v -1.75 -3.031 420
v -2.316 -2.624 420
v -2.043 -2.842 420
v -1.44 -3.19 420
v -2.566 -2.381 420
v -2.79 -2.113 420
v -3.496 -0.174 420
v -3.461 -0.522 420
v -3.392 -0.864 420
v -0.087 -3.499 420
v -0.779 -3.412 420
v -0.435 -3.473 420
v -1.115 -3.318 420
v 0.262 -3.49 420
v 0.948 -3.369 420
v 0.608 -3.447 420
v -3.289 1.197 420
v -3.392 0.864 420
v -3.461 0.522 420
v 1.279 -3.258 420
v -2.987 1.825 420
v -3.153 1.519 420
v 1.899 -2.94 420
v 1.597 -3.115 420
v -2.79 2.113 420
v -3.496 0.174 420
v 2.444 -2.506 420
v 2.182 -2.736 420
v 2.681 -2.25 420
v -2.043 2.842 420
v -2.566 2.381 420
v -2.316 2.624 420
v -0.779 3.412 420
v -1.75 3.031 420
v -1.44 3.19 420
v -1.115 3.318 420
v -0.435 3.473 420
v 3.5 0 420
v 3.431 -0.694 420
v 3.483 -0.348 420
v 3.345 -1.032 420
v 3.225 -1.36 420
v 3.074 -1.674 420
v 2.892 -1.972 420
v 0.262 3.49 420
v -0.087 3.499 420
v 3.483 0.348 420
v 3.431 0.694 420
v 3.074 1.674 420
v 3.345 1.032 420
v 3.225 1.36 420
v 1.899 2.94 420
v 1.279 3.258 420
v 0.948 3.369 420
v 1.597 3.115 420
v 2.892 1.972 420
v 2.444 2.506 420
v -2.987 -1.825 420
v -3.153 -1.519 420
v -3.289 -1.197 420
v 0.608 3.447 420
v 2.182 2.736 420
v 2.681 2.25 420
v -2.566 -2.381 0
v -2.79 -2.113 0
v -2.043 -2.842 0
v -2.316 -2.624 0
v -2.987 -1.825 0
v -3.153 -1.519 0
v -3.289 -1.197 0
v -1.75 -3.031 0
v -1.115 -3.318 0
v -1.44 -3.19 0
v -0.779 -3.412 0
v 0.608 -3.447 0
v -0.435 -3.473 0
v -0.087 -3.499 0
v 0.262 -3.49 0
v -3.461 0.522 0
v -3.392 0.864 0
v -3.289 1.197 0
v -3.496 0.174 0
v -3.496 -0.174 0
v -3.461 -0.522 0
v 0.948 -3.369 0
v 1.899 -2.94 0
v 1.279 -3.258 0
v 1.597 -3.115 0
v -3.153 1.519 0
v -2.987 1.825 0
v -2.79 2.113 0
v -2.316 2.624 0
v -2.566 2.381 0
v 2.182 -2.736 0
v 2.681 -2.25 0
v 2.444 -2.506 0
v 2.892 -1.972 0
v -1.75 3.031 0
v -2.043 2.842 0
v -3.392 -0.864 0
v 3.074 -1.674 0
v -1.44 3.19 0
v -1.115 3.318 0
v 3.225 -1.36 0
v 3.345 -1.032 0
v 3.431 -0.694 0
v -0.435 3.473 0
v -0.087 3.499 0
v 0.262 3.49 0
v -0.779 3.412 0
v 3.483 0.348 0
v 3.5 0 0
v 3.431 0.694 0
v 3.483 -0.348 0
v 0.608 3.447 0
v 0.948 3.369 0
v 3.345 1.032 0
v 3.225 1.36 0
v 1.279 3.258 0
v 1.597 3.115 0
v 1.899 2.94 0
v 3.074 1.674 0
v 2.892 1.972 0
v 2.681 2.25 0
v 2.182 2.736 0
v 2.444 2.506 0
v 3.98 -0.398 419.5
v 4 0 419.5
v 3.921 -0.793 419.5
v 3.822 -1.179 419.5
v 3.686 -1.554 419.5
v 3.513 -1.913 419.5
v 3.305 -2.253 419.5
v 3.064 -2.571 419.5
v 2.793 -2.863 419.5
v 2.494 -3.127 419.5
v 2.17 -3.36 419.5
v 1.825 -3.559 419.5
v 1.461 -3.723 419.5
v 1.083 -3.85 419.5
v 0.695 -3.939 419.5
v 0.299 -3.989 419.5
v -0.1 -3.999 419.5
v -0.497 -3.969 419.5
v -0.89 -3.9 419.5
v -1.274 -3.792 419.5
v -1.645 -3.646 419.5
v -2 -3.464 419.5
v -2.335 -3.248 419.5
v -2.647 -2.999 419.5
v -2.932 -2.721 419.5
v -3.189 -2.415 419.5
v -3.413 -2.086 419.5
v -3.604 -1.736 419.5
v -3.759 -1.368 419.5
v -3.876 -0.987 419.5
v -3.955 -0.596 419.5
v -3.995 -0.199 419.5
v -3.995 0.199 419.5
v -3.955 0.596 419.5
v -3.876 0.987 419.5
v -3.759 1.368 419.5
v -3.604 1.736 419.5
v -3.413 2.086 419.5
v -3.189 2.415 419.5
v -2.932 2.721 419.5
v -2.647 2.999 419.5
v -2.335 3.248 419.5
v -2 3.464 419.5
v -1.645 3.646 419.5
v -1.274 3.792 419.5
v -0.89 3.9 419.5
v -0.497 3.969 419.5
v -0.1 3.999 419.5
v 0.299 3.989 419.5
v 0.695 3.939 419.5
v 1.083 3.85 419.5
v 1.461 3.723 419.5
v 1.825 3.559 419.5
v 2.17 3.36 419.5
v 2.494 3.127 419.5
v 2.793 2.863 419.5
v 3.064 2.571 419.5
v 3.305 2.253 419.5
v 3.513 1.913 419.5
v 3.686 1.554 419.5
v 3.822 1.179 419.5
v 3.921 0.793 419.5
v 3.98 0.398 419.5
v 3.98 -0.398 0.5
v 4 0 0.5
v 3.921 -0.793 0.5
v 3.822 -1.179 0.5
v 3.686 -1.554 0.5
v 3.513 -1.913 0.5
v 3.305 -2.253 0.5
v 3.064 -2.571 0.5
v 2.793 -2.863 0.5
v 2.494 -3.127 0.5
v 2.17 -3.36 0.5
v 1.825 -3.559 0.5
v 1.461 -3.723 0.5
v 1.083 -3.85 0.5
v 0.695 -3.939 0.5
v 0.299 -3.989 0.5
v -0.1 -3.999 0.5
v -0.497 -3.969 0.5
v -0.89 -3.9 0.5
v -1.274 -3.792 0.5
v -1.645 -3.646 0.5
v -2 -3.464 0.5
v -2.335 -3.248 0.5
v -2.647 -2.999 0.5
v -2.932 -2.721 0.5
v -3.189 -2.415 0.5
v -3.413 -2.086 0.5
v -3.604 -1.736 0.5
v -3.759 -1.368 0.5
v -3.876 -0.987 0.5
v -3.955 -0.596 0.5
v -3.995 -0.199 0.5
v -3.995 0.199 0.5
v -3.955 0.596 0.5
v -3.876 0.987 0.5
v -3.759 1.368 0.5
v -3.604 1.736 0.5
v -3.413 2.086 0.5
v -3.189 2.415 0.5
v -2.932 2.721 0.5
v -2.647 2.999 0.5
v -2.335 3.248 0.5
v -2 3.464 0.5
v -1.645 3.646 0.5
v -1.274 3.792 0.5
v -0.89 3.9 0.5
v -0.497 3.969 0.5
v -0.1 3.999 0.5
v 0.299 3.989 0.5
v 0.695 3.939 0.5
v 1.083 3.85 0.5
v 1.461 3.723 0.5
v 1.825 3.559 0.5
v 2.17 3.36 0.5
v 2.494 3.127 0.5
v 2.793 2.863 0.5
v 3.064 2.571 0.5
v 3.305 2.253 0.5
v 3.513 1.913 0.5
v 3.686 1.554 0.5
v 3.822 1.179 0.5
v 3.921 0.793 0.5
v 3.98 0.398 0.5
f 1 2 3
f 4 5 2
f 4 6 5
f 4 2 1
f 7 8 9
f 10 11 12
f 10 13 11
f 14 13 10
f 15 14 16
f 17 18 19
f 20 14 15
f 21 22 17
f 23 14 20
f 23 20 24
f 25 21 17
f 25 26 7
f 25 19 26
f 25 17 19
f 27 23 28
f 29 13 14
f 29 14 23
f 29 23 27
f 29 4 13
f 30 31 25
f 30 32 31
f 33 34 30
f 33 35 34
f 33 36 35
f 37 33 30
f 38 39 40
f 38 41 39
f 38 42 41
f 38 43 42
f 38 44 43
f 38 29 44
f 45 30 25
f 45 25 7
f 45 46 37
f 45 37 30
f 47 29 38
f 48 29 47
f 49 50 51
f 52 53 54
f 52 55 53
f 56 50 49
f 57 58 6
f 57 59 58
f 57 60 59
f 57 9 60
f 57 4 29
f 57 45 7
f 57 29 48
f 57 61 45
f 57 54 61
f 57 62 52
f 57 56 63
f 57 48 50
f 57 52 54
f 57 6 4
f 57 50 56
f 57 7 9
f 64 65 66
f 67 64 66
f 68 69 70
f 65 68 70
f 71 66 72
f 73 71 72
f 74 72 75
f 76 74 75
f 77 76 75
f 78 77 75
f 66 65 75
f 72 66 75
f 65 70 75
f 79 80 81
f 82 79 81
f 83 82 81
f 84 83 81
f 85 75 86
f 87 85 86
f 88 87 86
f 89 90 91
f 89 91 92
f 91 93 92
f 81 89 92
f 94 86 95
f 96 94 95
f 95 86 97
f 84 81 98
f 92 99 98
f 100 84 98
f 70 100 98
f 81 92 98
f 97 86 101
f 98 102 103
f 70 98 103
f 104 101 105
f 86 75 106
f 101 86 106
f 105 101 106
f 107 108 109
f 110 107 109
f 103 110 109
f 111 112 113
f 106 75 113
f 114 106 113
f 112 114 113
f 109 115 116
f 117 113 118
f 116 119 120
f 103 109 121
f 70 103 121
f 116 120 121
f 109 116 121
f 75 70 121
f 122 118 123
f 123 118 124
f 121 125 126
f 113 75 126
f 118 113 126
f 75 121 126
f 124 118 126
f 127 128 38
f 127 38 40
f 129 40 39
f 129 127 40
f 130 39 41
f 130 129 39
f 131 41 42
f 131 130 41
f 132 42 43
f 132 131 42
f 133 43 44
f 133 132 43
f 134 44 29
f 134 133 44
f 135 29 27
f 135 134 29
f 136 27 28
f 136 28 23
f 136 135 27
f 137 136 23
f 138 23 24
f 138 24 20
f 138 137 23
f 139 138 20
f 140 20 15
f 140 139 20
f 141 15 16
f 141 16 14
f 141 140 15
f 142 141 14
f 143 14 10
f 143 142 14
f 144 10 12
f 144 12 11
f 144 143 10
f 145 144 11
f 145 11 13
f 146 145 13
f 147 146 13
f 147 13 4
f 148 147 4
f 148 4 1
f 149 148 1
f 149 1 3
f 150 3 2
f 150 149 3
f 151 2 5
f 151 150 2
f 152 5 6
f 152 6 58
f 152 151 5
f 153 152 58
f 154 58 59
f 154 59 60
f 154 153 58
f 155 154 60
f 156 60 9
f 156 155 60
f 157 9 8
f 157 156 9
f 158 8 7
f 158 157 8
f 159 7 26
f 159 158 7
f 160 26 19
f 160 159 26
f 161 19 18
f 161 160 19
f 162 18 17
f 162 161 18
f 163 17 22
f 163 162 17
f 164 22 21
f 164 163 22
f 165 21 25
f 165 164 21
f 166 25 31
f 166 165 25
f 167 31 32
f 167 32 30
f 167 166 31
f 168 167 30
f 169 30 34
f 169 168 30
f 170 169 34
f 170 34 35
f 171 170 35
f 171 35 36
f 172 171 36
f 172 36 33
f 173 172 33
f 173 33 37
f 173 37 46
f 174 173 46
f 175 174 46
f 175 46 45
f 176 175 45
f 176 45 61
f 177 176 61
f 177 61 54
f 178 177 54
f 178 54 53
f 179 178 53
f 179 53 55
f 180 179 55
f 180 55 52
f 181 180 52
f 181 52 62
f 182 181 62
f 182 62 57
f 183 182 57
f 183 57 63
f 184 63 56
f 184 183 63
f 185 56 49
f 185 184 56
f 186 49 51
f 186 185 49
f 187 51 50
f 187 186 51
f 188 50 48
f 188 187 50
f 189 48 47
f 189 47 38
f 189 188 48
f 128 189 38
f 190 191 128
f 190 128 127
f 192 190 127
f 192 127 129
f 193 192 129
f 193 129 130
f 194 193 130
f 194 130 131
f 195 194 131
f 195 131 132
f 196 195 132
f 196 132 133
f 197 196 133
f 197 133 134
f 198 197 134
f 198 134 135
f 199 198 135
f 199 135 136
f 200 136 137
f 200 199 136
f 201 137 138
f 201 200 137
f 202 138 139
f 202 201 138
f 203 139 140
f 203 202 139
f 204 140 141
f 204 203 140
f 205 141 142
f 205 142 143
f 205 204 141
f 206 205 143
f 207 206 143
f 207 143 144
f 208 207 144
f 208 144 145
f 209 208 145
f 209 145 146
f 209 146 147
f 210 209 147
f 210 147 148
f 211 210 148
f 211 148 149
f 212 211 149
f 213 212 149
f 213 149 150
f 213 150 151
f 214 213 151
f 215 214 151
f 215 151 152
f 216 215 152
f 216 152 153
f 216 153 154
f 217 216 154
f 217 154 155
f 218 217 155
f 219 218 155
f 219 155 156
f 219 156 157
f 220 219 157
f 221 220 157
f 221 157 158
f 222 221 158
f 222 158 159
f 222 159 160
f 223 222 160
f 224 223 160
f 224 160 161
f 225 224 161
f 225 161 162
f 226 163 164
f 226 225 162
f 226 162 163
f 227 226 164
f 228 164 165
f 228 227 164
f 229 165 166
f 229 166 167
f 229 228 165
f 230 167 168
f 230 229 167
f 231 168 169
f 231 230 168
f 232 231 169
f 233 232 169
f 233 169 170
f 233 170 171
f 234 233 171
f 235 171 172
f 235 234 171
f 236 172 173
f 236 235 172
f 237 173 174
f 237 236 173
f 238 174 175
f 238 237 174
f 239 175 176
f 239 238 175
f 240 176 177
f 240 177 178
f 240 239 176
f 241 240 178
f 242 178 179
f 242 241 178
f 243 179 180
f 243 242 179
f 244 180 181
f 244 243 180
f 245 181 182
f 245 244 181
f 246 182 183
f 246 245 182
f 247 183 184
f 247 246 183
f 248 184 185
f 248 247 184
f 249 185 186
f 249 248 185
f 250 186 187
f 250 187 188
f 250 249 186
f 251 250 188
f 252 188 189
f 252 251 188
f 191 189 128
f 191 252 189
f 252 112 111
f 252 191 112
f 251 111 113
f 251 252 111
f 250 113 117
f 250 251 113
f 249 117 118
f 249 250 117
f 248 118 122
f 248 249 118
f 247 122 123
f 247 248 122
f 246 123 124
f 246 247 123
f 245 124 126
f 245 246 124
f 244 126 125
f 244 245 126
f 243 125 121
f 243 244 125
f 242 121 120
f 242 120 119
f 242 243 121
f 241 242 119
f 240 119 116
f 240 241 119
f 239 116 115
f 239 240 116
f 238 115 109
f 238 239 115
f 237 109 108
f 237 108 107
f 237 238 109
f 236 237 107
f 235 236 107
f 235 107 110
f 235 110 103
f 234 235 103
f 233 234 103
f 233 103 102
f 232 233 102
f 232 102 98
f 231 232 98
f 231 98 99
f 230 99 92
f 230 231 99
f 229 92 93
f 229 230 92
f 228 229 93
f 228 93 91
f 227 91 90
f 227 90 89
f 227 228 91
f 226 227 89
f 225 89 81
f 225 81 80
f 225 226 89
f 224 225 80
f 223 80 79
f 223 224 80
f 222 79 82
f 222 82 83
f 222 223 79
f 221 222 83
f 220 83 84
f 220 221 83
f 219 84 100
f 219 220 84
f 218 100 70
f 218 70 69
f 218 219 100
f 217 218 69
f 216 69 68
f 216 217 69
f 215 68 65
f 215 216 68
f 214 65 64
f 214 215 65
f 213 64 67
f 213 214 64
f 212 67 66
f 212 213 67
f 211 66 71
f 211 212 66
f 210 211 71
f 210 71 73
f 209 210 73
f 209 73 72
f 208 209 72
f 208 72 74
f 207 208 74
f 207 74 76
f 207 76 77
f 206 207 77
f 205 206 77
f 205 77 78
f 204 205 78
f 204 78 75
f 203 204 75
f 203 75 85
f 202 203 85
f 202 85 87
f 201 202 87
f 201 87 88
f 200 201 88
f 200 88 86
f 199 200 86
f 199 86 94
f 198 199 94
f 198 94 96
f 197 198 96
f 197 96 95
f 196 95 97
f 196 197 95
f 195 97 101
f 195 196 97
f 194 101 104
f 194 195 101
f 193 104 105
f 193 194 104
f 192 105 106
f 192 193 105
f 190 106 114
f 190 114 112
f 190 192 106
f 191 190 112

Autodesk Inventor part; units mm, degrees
ref_plane "YZ Plane" through (0, 0, 0) normal (1, 0, 0) x (0, 1, 0)
ref_plane "XZ Plane" through (0, 0, 0) normal (0, 1, 0) x (-1, 0, 0)
ref_plane "XY Plane" through (0, 0, 0) normal (0, 0, 1) x (1, 0, 0)
sketch "Skizze1" plane through (0, 0, 0) normal (0, 0, 1) x (1, 0, 0)
  line L0 (-5.6, 0) -> (5.6, 0) projected
  line L1 (0, -5.6) -> (0, 5.6) projected
  circle A0 centre (0, 0) radius 4
  dimension "d0" = 8
extrude "Extrusion1" add sketch "Skizze1" along normal blind 420
thread "Gewinde1" size "M8x1.25" class "6g" standard "ANSI Metric M Profile" full length
chamfer "Fase1" distance 0.5 angle 45 1 edges at (-4, 0, 420)
chamfer "Fase2" distance 0.5 angle 45 1 edges at (-4, 0, 0)
properties part number "Gewindestange_M8x420mm"
